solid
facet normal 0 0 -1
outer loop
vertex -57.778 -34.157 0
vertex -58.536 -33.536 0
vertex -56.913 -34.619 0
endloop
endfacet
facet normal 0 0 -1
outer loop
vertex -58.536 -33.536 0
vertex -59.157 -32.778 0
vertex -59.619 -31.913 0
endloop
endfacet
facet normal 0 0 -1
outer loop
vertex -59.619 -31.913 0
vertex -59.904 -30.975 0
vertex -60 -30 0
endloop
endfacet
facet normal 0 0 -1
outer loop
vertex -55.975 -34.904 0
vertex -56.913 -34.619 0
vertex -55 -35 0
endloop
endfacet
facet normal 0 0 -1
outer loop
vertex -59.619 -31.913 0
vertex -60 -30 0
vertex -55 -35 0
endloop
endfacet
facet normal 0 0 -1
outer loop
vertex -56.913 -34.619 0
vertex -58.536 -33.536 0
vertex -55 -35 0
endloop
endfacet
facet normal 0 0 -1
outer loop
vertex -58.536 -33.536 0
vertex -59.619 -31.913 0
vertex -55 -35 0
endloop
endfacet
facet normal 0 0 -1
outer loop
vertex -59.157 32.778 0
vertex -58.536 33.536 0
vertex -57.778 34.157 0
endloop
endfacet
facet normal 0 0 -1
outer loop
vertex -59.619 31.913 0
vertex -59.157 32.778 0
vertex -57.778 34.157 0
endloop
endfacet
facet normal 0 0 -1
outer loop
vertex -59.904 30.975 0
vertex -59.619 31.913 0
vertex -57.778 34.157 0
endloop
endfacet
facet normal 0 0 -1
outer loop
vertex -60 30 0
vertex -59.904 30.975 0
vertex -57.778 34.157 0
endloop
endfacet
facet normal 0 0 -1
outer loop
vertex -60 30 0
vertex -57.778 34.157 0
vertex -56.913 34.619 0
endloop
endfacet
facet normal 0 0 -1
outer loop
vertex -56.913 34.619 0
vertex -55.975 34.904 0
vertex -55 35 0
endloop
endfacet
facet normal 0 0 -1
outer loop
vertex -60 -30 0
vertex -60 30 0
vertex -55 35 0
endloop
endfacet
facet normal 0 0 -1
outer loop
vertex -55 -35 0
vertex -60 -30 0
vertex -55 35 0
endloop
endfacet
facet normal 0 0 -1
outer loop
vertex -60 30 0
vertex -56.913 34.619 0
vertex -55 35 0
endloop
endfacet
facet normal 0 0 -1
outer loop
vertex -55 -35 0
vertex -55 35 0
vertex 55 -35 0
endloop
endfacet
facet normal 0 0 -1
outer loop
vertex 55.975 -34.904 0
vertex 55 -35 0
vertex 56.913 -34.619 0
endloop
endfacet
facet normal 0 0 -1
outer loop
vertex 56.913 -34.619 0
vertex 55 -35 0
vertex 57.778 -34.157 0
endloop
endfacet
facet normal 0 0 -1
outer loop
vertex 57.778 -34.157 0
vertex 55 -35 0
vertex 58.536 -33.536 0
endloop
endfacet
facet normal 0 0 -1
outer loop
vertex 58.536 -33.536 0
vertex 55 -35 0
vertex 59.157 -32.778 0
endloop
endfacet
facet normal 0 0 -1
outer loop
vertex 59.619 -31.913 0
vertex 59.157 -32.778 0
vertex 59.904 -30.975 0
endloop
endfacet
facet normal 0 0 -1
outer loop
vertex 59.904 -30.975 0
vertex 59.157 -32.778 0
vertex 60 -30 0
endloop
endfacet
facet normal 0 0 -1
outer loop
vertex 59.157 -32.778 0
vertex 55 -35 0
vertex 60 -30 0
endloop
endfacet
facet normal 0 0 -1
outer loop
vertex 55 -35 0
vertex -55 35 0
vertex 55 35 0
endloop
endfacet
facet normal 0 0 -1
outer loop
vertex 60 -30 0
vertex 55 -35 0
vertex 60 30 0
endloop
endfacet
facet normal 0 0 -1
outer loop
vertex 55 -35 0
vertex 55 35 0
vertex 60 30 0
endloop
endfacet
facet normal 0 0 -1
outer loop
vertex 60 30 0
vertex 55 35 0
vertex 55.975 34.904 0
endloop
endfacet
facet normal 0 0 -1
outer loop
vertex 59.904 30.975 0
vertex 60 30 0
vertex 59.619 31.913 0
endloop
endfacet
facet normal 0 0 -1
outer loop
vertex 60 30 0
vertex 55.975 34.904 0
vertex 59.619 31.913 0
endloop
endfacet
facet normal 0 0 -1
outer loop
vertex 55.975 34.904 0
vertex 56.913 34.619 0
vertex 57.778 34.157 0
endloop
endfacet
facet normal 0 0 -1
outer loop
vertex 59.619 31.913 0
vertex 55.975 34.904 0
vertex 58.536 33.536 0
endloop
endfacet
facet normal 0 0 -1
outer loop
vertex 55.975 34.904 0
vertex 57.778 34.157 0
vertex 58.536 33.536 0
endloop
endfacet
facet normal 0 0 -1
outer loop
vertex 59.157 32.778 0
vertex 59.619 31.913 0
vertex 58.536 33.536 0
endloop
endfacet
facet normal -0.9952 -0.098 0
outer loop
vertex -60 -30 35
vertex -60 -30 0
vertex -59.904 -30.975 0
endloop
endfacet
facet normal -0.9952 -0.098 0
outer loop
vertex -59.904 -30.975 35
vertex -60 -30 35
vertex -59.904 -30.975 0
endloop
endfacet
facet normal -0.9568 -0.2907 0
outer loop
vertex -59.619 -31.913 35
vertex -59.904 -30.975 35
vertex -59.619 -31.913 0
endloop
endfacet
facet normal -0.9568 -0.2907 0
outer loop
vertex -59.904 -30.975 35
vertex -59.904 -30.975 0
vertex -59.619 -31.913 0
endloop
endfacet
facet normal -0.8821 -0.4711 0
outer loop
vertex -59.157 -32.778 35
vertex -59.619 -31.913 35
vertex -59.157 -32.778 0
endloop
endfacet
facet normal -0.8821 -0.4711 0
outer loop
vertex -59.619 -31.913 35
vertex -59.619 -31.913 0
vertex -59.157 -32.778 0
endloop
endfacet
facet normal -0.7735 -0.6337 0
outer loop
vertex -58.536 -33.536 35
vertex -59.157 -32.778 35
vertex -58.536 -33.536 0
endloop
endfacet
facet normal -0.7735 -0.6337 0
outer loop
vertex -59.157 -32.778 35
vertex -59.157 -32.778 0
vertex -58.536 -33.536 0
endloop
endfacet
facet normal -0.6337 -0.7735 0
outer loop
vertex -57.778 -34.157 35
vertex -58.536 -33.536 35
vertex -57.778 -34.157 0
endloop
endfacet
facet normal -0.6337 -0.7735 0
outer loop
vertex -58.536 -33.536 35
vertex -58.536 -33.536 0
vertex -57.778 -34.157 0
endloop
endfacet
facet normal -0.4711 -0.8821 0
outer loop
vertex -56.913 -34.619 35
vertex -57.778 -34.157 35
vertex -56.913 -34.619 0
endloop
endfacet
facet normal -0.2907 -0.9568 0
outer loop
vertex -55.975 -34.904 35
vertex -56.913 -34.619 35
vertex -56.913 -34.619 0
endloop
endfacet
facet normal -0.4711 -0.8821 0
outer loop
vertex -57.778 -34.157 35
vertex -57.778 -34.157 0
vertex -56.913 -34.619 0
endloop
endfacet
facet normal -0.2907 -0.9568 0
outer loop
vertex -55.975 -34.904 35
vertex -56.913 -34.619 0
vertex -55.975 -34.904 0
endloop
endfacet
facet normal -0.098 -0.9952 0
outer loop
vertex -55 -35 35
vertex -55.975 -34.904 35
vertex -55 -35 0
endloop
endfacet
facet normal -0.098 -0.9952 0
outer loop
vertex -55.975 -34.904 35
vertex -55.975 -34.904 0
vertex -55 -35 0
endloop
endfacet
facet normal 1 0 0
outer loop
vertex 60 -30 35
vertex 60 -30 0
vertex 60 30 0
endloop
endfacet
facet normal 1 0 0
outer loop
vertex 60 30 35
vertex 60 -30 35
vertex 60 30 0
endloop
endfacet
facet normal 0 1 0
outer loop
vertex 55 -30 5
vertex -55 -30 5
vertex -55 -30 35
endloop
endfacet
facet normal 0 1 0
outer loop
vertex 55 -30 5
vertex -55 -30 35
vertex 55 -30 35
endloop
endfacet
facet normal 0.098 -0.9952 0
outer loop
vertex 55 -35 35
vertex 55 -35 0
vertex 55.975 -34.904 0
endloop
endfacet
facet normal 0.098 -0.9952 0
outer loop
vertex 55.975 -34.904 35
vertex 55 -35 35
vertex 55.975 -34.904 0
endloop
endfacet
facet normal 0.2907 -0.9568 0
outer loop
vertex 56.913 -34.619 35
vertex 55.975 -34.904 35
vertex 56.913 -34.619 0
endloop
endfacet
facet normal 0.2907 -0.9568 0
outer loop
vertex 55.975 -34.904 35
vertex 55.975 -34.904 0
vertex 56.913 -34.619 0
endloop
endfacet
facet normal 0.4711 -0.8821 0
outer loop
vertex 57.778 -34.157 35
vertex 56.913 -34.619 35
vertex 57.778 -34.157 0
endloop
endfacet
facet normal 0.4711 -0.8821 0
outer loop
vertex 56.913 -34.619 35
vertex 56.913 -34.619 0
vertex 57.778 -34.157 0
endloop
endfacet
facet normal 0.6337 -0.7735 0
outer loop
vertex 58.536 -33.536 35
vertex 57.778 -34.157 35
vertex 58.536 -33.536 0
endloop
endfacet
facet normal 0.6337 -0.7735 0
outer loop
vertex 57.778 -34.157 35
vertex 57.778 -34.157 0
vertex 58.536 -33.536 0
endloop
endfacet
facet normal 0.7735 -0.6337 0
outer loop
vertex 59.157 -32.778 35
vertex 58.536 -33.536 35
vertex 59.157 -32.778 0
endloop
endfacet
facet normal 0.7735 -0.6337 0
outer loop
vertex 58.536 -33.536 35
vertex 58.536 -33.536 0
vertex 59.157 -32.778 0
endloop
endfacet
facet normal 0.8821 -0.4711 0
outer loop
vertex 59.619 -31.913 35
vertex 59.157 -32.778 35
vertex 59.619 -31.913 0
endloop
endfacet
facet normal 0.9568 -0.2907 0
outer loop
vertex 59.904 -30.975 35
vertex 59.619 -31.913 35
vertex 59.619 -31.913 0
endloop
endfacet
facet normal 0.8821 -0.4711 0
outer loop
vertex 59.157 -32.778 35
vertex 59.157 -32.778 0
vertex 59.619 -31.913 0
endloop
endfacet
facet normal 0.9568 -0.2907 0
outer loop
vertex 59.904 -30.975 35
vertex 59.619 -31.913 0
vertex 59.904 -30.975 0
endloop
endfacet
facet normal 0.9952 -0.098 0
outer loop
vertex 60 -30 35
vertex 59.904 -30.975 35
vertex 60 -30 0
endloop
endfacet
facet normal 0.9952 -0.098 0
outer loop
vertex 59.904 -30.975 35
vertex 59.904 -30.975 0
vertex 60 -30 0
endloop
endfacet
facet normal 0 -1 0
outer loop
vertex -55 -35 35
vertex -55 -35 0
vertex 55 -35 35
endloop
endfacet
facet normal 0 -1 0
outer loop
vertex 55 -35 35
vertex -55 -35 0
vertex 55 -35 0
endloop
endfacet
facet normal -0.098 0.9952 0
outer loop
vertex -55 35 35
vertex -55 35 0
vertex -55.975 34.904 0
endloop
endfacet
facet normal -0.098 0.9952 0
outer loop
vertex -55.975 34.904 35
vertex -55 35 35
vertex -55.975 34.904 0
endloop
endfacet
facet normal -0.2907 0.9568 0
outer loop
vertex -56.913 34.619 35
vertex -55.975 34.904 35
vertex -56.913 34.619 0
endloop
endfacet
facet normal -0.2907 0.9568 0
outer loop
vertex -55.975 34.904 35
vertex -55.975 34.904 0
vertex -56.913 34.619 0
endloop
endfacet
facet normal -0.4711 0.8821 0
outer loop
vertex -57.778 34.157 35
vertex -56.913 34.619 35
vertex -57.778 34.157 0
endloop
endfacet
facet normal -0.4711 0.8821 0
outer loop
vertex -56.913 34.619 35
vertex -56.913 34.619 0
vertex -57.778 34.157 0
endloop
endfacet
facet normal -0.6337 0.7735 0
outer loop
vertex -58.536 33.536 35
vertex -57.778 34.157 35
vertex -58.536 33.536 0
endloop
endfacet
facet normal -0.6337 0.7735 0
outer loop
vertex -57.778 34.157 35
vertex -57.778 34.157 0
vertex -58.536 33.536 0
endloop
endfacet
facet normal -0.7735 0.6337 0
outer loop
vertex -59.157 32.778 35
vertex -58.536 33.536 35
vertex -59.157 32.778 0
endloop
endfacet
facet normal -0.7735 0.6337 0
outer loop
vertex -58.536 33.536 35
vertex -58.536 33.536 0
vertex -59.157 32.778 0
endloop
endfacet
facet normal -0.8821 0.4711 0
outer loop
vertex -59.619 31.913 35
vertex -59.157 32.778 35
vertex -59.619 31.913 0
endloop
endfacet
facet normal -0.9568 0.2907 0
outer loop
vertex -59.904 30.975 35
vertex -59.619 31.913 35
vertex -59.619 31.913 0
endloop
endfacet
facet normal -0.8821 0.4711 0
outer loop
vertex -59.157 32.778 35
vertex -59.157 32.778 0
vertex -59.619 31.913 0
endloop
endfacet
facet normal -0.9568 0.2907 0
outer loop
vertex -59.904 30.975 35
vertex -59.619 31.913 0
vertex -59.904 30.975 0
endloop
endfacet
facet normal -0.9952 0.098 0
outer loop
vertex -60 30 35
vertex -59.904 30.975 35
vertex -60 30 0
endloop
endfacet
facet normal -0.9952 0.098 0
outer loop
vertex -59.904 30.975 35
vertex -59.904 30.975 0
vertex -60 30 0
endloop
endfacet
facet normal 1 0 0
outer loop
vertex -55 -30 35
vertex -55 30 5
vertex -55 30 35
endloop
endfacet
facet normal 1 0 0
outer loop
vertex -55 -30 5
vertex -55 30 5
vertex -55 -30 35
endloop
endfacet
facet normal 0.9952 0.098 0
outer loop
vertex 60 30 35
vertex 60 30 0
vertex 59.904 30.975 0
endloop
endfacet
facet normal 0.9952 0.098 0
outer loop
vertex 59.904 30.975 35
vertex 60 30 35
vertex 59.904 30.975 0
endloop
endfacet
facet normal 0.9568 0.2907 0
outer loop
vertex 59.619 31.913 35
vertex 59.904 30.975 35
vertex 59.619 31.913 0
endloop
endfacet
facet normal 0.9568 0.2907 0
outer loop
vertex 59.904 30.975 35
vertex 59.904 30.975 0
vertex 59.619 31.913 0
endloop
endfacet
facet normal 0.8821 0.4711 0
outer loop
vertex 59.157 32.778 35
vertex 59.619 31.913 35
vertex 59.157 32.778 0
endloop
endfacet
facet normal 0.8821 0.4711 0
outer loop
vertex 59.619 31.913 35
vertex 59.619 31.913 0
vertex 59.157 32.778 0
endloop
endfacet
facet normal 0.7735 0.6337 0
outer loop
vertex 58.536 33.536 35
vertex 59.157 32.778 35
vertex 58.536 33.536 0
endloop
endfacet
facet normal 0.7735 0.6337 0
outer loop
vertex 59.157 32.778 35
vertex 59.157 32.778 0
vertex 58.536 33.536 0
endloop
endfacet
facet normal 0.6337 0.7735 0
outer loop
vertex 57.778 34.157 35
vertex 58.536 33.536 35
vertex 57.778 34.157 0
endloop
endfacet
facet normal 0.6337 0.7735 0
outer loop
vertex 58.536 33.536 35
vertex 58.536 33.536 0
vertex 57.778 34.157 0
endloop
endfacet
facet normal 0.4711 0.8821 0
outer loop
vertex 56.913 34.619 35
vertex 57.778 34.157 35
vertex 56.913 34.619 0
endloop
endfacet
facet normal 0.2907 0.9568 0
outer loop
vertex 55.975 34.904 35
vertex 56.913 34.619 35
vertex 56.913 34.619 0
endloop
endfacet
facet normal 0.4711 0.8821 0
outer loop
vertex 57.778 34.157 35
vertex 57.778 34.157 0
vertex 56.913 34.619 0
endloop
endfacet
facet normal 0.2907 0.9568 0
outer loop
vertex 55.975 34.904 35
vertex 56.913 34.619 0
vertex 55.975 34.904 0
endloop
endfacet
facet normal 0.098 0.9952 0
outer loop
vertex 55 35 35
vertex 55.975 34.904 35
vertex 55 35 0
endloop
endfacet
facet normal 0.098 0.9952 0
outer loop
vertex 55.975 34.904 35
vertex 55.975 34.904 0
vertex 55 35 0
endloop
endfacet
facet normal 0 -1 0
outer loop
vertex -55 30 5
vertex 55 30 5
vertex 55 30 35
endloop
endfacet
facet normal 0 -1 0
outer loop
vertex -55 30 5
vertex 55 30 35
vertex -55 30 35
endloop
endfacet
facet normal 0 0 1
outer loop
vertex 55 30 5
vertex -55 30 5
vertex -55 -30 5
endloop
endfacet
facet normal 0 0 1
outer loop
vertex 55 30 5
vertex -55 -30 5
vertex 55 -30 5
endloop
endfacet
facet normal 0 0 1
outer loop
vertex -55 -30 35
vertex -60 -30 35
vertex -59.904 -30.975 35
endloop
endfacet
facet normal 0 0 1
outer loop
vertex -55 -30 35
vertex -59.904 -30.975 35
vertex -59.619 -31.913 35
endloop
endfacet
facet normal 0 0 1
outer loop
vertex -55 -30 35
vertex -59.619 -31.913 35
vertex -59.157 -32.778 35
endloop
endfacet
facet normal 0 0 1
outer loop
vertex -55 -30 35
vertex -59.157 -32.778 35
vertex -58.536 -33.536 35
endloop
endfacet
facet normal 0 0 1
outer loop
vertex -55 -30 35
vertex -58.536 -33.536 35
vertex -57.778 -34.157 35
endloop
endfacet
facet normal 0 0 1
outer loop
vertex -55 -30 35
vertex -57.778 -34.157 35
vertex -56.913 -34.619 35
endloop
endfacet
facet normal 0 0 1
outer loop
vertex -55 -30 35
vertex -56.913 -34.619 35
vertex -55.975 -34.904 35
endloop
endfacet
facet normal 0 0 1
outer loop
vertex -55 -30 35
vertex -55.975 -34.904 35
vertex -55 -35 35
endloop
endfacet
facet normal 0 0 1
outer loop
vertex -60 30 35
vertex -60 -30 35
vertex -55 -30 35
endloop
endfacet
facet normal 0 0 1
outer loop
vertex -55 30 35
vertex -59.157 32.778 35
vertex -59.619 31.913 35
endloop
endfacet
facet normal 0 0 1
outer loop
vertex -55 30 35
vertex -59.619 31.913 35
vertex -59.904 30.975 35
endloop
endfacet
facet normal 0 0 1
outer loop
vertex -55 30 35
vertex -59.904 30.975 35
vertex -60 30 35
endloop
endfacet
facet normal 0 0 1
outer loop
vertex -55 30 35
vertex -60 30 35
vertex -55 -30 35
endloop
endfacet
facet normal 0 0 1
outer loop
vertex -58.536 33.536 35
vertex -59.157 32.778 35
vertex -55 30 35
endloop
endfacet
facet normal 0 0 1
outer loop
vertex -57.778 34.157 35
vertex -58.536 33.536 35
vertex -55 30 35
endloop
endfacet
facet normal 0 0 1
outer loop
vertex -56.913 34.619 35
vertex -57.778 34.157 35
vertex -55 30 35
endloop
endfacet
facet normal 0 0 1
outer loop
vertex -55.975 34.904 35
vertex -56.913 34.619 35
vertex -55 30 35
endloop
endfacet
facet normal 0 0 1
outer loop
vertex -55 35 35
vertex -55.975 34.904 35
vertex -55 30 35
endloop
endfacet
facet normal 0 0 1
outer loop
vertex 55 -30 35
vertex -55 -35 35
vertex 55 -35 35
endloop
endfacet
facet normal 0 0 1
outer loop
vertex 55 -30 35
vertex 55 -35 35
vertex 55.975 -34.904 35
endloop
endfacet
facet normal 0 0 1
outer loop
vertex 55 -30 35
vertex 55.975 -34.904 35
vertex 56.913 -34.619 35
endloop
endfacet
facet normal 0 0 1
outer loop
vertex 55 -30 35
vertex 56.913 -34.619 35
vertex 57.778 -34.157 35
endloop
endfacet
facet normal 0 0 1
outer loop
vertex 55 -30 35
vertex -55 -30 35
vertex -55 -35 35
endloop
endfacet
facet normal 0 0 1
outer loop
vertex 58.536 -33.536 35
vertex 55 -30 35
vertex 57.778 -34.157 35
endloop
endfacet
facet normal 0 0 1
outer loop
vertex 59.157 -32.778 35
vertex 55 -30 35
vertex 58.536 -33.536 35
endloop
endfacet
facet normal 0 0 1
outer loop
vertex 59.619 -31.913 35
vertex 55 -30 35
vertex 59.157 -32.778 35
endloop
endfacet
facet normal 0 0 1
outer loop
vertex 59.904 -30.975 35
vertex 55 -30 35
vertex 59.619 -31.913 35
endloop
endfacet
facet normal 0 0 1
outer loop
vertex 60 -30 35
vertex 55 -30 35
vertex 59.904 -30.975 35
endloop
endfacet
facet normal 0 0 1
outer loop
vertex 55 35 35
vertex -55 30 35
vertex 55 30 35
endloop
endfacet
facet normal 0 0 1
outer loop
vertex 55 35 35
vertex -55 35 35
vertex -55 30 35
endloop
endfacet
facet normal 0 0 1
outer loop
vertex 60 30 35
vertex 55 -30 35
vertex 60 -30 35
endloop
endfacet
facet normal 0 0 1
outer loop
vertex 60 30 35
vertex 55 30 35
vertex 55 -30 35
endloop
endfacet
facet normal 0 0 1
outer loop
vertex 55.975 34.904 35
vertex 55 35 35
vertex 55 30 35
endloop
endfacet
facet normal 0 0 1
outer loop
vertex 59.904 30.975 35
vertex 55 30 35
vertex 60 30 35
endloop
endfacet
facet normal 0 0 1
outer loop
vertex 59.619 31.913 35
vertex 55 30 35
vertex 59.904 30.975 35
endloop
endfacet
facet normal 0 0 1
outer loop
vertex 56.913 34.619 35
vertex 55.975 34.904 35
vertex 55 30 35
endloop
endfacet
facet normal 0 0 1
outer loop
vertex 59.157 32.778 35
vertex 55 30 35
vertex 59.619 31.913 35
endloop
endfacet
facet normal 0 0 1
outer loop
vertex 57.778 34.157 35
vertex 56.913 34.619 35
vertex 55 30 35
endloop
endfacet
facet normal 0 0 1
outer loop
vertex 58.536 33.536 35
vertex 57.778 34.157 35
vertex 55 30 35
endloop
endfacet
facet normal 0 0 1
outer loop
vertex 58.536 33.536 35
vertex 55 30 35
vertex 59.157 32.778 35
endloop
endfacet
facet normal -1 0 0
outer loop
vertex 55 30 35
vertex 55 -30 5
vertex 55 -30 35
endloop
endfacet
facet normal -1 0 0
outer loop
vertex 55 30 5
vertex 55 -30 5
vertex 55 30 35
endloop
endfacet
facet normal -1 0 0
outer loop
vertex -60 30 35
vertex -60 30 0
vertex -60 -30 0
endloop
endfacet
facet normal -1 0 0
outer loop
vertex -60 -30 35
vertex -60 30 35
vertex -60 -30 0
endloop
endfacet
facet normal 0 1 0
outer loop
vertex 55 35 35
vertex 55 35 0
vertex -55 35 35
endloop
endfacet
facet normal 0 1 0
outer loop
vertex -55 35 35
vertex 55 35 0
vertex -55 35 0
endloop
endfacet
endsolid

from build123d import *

# Parameters (mm, degrees)
F1_DEPTH = 35
F2_T     = 5


# Not quite as in the source:
# - a shell that OpenCascade refuses in one call is made with other operations: the cavity is built on its own and cut out


with BuildPart() as f1:
    # F0 (on Top) → F1 (new body)
    with BuildSketch(Plane.XY):
        with BuildLine():
            Line((55, 35), (-55, 35))
            ThreePointArc((-55, 35), (-58.5355339059, 33.5355339059), (-60, 30))
            Line((-60, 30), (-60, -30))
            ThreePointArc((-60, -30), (-58.5355339059, -33.5355339059), (-55, -35))
            Line((-55, -35), (55, -35))
            ThreePointArc((55, -35), (58.5355339059, -33.5355339059), (60, -30))
            Line((60, -30), (60, 30))
            ThreePointArc((60, 30), (58.5355339059, 33.5355339059), (55, 35))
        make_face()
    extrude(amount=F1_DEPTH)

    # F2: shell of thickness 5, made by hand


with BuildPart() as f2_core1:
    # F2_t2: copy of F1
    add(f1.part)

    # the walls: a layer under each face that stays
    f2_faces = [f2_core1.faces().sort_by_distance(p)[0] for p in [
        (0, 35, 17.5),
        (-60, 0, 17.5),
        (0, -35, 17.5),
        (60, 0, 17.5),
        (0, 0, 0),
    ]]
    thicken(f2_faces, amount=-F2_T, mode=Mode.SUBTRACT)


with BuildPart() as f1_1:
    add(f1.part)

    # what is left inside the walls is the cavity
    f2_cavity = [f2_core1.part.solids().sort_by_distance(p)[0] for p in [
        (0, -10, 5.05),
    ]]
    add(f2_cavity, mode=Mode.SUBTRACT)


solid = f1_1.part
